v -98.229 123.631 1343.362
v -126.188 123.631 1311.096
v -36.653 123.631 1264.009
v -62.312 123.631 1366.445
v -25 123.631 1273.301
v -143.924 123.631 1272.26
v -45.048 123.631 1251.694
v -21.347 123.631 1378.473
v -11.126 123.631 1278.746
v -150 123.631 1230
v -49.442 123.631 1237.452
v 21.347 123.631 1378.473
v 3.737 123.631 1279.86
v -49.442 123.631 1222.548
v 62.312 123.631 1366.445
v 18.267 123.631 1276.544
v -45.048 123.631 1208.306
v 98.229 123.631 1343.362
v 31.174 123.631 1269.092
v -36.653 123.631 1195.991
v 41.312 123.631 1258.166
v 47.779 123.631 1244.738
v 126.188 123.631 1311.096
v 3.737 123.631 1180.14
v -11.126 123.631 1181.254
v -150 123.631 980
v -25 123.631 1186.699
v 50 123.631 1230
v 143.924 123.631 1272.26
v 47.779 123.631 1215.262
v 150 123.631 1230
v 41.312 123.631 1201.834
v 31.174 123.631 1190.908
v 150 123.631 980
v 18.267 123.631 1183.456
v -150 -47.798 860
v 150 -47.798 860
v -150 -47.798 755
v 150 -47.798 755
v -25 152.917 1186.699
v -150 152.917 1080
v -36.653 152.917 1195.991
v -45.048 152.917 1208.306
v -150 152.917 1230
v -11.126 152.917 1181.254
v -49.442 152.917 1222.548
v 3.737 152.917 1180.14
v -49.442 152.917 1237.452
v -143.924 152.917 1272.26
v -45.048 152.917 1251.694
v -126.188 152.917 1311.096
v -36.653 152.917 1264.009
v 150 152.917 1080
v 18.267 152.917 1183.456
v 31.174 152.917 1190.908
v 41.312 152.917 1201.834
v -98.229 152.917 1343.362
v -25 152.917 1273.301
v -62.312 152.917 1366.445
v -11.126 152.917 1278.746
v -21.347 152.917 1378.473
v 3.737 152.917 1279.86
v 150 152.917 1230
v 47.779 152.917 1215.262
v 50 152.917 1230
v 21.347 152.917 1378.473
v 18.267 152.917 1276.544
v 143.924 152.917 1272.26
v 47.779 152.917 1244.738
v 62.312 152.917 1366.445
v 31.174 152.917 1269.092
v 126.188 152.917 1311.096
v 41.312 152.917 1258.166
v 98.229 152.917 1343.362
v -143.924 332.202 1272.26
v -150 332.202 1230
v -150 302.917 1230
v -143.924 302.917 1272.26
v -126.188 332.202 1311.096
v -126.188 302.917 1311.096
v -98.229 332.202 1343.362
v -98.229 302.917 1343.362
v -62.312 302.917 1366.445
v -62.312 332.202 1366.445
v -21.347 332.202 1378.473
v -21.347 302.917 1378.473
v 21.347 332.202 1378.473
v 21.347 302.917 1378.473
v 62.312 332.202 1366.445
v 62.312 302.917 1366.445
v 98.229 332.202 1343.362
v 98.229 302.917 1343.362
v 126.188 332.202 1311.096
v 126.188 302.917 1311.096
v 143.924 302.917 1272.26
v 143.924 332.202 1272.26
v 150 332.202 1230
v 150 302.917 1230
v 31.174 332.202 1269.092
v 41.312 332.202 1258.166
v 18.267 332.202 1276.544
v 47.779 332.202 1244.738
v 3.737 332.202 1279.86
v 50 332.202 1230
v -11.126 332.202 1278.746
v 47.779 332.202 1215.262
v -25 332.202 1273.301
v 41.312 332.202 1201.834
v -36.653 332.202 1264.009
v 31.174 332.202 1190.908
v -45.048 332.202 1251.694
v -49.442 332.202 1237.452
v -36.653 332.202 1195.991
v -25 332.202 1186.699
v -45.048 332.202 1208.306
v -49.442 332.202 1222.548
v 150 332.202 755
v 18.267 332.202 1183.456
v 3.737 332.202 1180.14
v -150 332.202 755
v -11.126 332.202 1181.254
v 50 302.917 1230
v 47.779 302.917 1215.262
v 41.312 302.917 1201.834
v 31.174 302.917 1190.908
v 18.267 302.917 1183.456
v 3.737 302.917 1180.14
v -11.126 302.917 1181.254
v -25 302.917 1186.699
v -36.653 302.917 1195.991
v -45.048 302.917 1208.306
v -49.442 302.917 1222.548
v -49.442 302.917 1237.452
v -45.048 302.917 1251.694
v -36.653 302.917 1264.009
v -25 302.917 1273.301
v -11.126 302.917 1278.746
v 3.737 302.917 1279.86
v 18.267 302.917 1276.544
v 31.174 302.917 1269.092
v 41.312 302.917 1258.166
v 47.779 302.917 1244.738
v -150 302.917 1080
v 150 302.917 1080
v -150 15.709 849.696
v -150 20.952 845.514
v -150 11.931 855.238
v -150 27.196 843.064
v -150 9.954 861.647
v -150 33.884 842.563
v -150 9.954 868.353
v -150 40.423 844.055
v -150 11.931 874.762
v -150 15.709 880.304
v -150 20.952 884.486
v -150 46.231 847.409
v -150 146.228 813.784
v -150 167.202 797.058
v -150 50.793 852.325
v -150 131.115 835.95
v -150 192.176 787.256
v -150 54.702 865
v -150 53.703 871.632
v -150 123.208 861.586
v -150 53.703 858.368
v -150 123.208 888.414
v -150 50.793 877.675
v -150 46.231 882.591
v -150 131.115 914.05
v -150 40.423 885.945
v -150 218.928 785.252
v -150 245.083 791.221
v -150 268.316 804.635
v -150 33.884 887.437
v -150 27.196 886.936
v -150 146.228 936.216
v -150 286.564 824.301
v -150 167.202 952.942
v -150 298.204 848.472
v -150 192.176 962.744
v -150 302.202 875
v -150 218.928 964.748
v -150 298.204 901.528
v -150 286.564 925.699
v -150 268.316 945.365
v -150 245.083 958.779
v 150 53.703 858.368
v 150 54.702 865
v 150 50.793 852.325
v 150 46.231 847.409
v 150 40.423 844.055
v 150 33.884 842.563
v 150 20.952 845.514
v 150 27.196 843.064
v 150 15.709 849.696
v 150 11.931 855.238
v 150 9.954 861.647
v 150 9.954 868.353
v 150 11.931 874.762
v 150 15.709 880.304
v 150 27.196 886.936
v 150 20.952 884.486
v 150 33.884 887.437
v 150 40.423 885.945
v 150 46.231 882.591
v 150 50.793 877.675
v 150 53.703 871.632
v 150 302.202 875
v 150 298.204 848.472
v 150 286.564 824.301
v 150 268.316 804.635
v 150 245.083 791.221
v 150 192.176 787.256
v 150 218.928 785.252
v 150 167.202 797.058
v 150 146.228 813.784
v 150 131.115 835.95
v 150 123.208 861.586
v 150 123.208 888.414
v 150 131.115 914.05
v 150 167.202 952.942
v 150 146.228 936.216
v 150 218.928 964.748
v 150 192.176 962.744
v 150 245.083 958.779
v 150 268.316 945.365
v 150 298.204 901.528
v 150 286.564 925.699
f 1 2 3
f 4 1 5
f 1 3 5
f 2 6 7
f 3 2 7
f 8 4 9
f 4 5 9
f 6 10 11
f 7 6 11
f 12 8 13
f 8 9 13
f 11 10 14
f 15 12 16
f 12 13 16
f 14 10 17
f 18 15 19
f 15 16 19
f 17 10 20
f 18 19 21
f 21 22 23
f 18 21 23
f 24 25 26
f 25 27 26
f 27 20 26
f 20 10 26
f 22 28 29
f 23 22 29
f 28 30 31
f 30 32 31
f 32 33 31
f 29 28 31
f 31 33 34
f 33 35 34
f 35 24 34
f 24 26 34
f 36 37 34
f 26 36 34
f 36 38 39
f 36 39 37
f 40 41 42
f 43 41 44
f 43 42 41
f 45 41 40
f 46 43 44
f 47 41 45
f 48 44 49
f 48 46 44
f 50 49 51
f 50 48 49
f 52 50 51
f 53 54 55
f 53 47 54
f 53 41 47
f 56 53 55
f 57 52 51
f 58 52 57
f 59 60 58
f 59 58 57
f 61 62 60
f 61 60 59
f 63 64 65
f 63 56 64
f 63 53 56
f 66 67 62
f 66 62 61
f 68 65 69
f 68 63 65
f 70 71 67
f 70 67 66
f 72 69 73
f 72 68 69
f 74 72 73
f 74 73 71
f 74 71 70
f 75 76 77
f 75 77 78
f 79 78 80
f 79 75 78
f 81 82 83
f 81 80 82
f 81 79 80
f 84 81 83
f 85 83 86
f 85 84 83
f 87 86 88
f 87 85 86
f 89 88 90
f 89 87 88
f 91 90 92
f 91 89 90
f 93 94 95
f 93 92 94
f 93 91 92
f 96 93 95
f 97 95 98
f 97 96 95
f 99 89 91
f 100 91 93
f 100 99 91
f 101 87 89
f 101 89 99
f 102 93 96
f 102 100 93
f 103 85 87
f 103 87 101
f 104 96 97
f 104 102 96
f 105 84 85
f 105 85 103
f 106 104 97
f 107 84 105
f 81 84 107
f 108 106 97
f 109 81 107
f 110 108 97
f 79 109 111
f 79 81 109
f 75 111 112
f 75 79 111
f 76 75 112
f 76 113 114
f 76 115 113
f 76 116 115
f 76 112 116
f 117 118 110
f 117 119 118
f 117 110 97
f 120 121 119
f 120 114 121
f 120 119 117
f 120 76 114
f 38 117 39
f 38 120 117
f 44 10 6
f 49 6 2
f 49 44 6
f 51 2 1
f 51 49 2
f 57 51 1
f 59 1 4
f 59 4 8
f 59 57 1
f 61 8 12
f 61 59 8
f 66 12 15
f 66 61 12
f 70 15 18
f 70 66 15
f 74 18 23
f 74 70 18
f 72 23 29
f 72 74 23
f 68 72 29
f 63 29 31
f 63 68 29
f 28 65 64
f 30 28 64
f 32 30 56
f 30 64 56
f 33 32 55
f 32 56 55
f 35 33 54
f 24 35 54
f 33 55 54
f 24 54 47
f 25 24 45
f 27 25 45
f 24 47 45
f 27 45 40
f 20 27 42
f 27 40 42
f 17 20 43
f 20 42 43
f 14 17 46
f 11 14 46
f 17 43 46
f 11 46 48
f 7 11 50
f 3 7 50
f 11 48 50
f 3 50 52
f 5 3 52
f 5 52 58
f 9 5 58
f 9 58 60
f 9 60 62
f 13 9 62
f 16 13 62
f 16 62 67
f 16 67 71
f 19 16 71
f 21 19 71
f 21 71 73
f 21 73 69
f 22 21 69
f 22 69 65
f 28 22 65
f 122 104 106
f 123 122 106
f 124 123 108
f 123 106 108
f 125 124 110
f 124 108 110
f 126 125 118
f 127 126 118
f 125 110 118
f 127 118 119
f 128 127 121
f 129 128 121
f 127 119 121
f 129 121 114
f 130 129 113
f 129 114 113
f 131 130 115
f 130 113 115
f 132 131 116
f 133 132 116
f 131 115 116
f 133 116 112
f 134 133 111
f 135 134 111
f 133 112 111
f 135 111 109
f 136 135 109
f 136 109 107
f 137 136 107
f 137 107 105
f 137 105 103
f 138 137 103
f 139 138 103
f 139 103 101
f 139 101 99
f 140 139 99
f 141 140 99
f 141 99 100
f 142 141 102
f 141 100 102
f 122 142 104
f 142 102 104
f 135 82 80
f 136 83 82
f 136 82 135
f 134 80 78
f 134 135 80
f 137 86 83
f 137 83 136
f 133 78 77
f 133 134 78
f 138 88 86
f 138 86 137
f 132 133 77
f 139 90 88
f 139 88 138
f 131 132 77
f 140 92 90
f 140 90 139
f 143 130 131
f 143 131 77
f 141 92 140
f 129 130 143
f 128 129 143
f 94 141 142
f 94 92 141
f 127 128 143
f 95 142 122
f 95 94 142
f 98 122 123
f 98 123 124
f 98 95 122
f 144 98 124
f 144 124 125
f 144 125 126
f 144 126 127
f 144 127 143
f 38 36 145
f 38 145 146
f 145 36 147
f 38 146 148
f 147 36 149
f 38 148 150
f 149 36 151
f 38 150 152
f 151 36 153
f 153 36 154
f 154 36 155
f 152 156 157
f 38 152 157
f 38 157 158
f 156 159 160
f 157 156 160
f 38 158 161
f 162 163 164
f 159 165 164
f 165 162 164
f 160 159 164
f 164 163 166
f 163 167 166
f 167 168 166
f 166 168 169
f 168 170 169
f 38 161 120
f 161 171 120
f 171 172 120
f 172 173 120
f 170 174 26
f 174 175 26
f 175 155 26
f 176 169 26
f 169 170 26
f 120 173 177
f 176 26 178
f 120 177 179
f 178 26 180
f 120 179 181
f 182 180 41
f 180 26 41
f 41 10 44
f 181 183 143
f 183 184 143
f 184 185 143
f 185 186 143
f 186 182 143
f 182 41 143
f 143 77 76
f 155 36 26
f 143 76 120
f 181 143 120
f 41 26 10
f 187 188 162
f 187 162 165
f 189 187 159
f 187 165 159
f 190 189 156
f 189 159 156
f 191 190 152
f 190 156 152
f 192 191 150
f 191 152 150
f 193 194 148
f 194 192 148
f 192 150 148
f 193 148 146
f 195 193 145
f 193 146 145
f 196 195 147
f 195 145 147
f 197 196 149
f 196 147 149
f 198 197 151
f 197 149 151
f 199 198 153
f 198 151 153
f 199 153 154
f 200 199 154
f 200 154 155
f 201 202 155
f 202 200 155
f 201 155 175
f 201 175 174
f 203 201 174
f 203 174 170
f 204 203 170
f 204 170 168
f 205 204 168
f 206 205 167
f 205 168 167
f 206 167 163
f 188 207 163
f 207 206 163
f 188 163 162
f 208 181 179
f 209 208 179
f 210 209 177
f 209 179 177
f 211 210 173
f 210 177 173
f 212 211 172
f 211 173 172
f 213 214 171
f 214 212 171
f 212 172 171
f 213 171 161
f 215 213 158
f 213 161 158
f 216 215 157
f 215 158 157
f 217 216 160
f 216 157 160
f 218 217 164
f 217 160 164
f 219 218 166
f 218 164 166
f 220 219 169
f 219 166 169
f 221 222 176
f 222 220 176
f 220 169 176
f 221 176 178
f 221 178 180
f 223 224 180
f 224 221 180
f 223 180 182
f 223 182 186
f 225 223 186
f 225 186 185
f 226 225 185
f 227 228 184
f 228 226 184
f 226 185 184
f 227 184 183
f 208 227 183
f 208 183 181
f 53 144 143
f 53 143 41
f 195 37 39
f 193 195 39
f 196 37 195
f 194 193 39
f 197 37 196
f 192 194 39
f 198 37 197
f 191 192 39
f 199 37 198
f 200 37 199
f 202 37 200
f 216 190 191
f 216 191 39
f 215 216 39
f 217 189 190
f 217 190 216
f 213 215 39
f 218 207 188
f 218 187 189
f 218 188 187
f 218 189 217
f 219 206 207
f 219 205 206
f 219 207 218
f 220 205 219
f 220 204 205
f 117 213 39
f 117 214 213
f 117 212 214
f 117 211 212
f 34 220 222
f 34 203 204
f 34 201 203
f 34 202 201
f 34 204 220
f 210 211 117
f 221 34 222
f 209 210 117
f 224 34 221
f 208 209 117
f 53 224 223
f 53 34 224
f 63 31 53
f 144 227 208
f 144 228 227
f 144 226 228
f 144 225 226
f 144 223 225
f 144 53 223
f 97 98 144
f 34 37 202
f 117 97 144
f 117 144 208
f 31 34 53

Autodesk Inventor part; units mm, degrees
ref_plane "YZ Plane" through (0, 0, 0) normal (1, 0, 0) x (0, 1, 0)
ref_plane "XZ Plane" through (0, 0, 0) normal (0, 1, 0) x (-1, 0, 0)
ref_plane "XY Plane" through (0, 0, 0) normal (0, 0, 1) x (1, 0, 0)
sketch "草圖1" plane through (0, 0, 0) normal (1, 0, 0) x (0, 1, 0)
  circle A0 centre (212.2024, 875) radius 90
  line L0 (152.2024, 1000) -> (352.2024, 1000)
  line L1 (352.2024, 1000) -> (352.2024, 785)
  circle A1 centre (32.2024, 865) radius 22.5
  line L2 (-154.9405, 785) -> (152.2024, 1000)
  line L3 (352.2024, 735) -> (352.2024, 1000)
  line L4 (-226.369, 735) -> (352.2024, 735)
  line L5 (152.2024, 1000) -> (-226.369, 735)
  line L6 (123.631, 980) -> (332.2024, 980)
  line L7 (332.2024, 980) -> (332.2024, 755)
  line L8 (332.2024, 755) -> (-47.7976, 755)
  line L9 (-47.7976, 755) -> (-47.7976, 860)
  line L10 (-47.7976, 860) -> (123.631, 980)
  circle A2 centre (212.2024, 875) radius 90
  circle A3 centre (32.2024, 865) radius 22.5
  point P0 (0, 0)
  dimension "d8" = 20
  dimension "d9" = 20
  dimension "d10" = 20
  dimension "d11" = 400
extrude "擠出1" add sketch "草圖1" along normal mid plane 300 contours L6 L7 L8 L9 L2
sketch "草圖2" plane through (-150, 332.2024, 980) normal (0, 1, 0) x (1, 0, 0)
  line L0 (0, 0) -> (300, 0) projected
  line L1 (300, 225) -> (300, 0) projected
  line L2 (300, 225) -> (0, 225) projected
  line L3 (0, 0) -> (0, 225) projected
  circle A0 centre (150, -250) radius 50
  circle A1 centre (150, -250) radius 150
  line L4 (0, 0) -> (300, 0) projected
  line L5 (0, 0) -> (0, -250)
  line L6 (300, 225) -> (300, 0) projected
  line L7 (300, 0) -> (300, -250)
  point P0 (150, 980)
  point P1 (150, 0)
  dimension "d14" = 250
  dimension "d15" = 100
extrude "擠出2" add sketch "草圖2" against normal blind 208.571 contours L0 L7 A1 L5 | A1
sketch "草圖3" plane through (150, 0, 0) normal (1, 0, 0) x (0, 0, -1)
  line L0 (-1230, 332.2024) -> (-1230, 332.2024) projected
  line L1 (-1230, 332.2024) -> (-1230, 123.6314) projected
  line L2 (-1230, 123.6314) -> (-1230, 123.6314) projected
  line L3 (-1230, 332.2024) -> (-1230, 123.6314) projected
  line L4 (-755, 332.2024) -> (-1230, 332.2024) projected
  line L5 (-1230, 332.2024) -> (-1230, 123.6314) projected
  line L6 (-980, 123.6314) -> (-1230, 123.6314) projected
  line L7 (-980, 123.6314) -> (-980, 123.631) projected
  line L8 (-980, 123.631) -> (-860, -47.7976) projected
  line L9 (-860, -47.7976) -> (-755, -47.7976) projected
  line L10 (-755, -47.7976) -> (-755, 332.2024) projected
  circle A0 centre (-875, 212.2024) radius 90 projected
  circle A1 centre (-865, 32.2024) radius 22.5 projected
  line L11 (-1380, 302.9169) -> (-1080, 302.9169)
  line L12 (-1080, 302.9169) -> (-1080, 152.9169)
  line L13 (-1080, 152.9169) -> (-1380, 152.9169)
  line L14 (-1380, 152.9169) -> (-1380, 302.9169)
  line L15 (-1380, 332.2024) -> (-1380, 123.6314) projected
  line L16 (-1380, 123.6314) -> (-1230, 123.6314) projected
  line L17 (-1230, 332.2024) -> (-1380, 332.2024) projected
  point P0 (0, 0)
  point P1 (-1380, 227.9169)
  point P2 (-1230, 227.9169)
  dimension "d18" = 150
  dimension "d19" = 300
extrude "擠出3" cut sketch "草圖3" against normal through all contours L11 L12 L13 L1 | L1 L13 L14 L11
thread "螺紋1" size "M45x4.5" class "6H" standard "ANSI Metric M Profile" full length
sketch "草圖4" plane through (150, 152.9169, 1230) normal (0, 1, 0) x (1, 0, 0)
  line L0 (0, 150) -> (-300, 150) projected
  line L1 (-300, 0) -> (-300, 150) projected
  arc A0 (-300, 0) -> (0, 0) centre (-150, 0) ccw projected
  line L2 (0, 150) -> (0, 0) projected
  line L3 (0, 287.2857) -> (0, 150) projected
  line L4 (-300, 287.2857) -> (0, 287.2857) projected
  line L5 (-300, 150) -> (-300, 287.2857) projected
  line L6 (-300, 422.7143) -> (-300, 475) projected
  line L7 (-300, 475) -> (0, 475) projected
  line L8 (0, 475) -> (0, 422.7143) projected
  line L9 (0, 422.7143) -> (-300, 422.7143) projected
  circle A1 centre (-150, 0) radius 50 projected
  point P0 (-150, 1230)
properties part number "萬象塊"
